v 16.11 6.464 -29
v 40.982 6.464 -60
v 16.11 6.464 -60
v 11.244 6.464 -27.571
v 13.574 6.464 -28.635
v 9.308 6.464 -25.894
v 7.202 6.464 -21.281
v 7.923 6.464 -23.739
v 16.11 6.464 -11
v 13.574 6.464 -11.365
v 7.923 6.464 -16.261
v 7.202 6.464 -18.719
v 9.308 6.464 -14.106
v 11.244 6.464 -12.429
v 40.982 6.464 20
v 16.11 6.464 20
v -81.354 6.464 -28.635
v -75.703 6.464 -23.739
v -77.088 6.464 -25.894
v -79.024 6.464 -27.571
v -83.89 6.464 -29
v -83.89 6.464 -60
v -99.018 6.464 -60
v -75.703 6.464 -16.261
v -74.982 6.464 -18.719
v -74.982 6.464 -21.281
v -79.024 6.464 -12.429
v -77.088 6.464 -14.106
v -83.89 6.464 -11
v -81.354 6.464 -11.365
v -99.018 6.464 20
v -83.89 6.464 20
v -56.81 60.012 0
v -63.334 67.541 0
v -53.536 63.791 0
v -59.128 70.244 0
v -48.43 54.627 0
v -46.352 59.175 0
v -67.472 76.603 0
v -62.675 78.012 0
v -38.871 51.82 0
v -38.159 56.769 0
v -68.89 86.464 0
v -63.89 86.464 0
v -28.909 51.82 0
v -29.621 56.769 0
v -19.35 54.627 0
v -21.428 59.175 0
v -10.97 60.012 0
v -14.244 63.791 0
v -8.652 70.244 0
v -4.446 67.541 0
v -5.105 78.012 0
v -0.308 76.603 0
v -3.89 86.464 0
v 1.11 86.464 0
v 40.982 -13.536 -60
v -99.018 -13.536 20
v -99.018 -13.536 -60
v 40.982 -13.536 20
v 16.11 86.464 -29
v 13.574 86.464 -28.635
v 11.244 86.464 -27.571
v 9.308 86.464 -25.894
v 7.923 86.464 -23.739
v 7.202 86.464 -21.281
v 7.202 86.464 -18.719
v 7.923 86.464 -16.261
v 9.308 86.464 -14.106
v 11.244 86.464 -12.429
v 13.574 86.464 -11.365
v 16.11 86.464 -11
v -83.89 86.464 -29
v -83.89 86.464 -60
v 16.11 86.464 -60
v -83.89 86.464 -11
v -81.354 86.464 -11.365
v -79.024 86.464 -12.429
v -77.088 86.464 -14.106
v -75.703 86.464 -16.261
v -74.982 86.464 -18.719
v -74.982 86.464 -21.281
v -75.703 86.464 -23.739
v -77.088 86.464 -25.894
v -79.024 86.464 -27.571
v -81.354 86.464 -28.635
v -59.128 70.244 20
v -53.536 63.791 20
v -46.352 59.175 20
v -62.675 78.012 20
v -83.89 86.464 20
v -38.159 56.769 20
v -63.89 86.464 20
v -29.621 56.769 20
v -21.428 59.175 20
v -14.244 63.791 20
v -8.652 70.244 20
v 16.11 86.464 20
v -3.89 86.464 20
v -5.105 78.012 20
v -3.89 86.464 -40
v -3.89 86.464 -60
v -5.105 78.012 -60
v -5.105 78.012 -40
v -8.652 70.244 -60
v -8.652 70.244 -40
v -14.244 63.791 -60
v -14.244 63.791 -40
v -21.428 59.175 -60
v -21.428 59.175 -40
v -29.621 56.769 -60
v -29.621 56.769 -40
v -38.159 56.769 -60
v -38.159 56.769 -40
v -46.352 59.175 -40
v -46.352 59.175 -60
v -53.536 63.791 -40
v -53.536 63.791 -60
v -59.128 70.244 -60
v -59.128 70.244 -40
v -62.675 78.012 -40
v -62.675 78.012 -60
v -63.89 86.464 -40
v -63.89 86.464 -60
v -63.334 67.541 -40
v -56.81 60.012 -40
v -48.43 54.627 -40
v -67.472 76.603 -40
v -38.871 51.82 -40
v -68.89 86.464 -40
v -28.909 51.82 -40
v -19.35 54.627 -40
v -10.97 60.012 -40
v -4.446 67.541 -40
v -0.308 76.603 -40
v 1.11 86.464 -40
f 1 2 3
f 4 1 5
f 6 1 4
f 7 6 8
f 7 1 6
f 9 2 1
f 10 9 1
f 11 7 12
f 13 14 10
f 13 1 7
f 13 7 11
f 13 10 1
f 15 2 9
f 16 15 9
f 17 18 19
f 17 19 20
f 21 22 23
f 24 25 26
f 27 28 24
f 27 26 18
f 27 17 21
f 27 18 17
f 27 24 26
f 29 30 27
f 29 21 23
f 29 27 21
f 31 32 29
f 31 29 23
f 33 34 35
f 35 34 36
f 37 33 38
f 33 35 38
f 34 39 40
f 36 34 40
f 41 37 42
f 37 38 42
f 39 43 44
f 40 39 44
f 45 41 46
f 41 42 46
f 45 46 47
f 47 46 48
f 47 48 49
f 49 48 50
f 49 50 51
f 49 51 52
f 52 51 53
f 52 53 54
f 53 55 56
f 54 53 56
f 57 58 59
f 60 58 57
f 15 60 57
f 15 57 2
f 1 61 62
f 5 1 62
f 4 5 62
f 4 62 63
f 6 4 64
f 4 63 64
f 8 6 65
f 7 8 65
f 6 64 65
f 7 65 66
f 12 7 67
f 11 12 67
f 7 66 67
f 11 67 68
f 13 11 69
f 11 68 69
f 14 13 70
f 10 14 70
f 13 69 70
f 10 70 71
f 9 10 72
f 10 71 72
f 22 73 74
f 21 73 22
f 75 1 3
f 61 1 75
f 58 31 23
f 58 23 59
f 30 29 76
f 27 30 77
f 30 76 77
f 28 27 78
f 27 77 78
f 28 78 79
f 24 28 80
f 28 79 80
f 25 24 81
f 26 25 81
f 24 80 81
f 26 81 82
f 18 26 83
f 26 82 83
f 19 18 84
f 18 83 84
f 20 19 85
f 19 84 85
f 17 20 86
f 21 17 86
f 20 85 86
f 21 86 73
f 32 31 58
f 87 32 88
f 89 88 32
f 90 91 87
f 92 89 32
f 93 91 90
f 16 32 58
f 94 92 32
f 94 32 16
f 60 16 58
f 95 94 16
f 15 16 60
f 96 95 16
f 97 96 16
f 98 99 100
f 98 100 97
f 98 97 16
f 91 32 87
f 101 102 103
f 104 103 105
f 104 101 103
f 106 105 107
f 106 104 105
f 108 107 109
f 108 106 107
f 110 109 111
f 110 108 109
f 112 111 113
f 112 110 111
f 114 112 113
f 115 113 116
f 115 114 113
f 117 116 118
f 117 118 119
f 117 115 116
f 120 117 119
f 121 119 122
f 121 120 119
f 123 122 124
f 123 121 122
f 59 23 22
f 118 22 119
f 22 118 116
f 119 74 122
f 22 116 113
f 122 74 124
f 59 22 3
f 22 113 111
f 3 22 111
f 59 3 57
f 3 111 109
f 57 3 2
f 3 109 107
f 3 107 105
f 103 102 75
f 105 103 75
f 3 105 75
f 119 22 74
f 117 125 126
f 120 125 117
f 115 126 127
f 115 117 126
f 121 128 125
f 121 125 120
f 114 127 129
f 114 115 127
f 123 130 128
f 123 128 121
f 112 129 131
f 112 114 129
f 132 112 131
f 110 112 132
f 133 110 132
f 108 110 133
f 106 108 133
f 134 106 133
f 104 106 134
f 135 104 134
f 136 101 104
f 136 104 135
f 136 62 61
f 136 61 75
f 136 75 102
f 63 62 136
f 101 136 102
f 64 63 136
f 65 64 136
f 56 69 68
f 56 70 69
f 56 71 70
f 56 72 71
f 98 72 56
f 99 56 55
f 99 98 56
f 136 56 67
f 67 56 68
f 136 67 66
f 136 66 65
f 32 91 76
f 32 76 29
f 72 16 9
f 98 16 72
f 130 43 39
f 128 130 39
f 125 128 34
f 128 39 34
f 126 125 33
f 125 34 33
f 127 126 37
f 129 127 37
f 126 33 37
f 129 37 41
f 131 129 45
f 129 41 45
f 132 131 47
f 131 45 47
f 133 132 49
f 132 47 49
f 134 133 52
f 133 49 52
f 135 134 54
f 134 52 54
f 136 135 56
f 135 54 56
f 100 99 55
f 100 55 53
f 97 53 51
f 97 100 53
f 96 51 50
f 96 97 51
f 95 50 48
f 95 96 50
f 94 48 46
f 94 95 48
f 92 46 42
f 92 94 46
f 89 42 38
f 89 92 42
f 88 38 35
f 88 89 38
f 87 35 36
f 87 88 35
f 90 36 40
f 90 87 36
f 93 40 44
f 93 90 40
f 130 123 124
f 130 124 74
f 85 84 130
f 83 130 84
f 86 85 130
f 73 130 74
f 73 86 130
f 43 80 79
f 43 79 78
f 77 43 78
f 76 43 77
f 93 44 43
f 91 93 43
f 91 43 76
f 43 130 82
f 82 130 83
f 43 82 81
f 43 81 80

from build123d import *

# Parameters (mm, degrees)
BOSS_EXTRUDE1_DEPTH = 80
SKETCH2_R           = 9
CUT_EXTRUDE1_DEPTH  = 80
SKETCH5_R           = 35
CUT_EXTRUDE2_DEPTH  = 40


with BuildPart() as part:
    # Sketch1 → Boss-Extrude1 (new body)
    with BuildSketch(Plane.XY):
        with BuildLine():
            Line((-99.017681729, 6.463654224), (-99.017681729, -13.536345776))
            Line((-99.017681729, -13.536345776), (40.982318271, -13.536345776))
            Line((40.982318271, -13.536345776), (40.982318271, 6.463654224))
            Line((40.982318271, 6.463654224), (16.110019646, 6.463654224))
            Line((16.110019646, 6.463654224), (16.110019646, 86.463654224))
            Line((16.110019646, 86.463654224), (-3.889980354, 86.463654224))
            ThreePointArc((-3.889980354, 86.463654224), (-33.889980354, 56.463654224), (-63.889980354, 86.463654224))
            Line((-63.889980354, 86.463654224), (-83.889980354, 86.463654224))
            Line((-83.889980354, 86.463654224), (-83.889980354, 6.463654224))
            Line((-83.889980354, 6.463654224), (-99.017681729, 6.463654224))
        make_face()
    extrude(amount=-BOSS_EXTRUDE1_DEPTH)

    # Sketch2 → Cut-Extrude1 (cut)
    with BuildSketch(Plane(origin=(0, 86.463654224, 0), x_dir=(1, 0, 0), z_dir=(0, 1, 0))):
        with Locations((16.110019646, 40)):
            Circle(SKETCH2_R)
        with Locations((-83.889980354, 40)):
            Circle(SKETCH2_R)
    extrude(amount=-CUT_EXTRUDE1_DEPTH, mode=Mode.SUBTRACT)


with BuildPart() as part_1:
    # Body-Move/Copy1: moved
    add(part.part.moved(Location((0, 0, 20))))

    # Sketch5 → Cut-Extrude2 (cut)
    with BuildSketch(Plane.XY):
        with Locations((-33.889980354, 86.463654224)):
            Circle(SKETCH5_R)
    extrude(amount=-CUT_EXTRUDE2_DEPTH, mode=Mode.SUBTRACT)


solid = part_1.part
